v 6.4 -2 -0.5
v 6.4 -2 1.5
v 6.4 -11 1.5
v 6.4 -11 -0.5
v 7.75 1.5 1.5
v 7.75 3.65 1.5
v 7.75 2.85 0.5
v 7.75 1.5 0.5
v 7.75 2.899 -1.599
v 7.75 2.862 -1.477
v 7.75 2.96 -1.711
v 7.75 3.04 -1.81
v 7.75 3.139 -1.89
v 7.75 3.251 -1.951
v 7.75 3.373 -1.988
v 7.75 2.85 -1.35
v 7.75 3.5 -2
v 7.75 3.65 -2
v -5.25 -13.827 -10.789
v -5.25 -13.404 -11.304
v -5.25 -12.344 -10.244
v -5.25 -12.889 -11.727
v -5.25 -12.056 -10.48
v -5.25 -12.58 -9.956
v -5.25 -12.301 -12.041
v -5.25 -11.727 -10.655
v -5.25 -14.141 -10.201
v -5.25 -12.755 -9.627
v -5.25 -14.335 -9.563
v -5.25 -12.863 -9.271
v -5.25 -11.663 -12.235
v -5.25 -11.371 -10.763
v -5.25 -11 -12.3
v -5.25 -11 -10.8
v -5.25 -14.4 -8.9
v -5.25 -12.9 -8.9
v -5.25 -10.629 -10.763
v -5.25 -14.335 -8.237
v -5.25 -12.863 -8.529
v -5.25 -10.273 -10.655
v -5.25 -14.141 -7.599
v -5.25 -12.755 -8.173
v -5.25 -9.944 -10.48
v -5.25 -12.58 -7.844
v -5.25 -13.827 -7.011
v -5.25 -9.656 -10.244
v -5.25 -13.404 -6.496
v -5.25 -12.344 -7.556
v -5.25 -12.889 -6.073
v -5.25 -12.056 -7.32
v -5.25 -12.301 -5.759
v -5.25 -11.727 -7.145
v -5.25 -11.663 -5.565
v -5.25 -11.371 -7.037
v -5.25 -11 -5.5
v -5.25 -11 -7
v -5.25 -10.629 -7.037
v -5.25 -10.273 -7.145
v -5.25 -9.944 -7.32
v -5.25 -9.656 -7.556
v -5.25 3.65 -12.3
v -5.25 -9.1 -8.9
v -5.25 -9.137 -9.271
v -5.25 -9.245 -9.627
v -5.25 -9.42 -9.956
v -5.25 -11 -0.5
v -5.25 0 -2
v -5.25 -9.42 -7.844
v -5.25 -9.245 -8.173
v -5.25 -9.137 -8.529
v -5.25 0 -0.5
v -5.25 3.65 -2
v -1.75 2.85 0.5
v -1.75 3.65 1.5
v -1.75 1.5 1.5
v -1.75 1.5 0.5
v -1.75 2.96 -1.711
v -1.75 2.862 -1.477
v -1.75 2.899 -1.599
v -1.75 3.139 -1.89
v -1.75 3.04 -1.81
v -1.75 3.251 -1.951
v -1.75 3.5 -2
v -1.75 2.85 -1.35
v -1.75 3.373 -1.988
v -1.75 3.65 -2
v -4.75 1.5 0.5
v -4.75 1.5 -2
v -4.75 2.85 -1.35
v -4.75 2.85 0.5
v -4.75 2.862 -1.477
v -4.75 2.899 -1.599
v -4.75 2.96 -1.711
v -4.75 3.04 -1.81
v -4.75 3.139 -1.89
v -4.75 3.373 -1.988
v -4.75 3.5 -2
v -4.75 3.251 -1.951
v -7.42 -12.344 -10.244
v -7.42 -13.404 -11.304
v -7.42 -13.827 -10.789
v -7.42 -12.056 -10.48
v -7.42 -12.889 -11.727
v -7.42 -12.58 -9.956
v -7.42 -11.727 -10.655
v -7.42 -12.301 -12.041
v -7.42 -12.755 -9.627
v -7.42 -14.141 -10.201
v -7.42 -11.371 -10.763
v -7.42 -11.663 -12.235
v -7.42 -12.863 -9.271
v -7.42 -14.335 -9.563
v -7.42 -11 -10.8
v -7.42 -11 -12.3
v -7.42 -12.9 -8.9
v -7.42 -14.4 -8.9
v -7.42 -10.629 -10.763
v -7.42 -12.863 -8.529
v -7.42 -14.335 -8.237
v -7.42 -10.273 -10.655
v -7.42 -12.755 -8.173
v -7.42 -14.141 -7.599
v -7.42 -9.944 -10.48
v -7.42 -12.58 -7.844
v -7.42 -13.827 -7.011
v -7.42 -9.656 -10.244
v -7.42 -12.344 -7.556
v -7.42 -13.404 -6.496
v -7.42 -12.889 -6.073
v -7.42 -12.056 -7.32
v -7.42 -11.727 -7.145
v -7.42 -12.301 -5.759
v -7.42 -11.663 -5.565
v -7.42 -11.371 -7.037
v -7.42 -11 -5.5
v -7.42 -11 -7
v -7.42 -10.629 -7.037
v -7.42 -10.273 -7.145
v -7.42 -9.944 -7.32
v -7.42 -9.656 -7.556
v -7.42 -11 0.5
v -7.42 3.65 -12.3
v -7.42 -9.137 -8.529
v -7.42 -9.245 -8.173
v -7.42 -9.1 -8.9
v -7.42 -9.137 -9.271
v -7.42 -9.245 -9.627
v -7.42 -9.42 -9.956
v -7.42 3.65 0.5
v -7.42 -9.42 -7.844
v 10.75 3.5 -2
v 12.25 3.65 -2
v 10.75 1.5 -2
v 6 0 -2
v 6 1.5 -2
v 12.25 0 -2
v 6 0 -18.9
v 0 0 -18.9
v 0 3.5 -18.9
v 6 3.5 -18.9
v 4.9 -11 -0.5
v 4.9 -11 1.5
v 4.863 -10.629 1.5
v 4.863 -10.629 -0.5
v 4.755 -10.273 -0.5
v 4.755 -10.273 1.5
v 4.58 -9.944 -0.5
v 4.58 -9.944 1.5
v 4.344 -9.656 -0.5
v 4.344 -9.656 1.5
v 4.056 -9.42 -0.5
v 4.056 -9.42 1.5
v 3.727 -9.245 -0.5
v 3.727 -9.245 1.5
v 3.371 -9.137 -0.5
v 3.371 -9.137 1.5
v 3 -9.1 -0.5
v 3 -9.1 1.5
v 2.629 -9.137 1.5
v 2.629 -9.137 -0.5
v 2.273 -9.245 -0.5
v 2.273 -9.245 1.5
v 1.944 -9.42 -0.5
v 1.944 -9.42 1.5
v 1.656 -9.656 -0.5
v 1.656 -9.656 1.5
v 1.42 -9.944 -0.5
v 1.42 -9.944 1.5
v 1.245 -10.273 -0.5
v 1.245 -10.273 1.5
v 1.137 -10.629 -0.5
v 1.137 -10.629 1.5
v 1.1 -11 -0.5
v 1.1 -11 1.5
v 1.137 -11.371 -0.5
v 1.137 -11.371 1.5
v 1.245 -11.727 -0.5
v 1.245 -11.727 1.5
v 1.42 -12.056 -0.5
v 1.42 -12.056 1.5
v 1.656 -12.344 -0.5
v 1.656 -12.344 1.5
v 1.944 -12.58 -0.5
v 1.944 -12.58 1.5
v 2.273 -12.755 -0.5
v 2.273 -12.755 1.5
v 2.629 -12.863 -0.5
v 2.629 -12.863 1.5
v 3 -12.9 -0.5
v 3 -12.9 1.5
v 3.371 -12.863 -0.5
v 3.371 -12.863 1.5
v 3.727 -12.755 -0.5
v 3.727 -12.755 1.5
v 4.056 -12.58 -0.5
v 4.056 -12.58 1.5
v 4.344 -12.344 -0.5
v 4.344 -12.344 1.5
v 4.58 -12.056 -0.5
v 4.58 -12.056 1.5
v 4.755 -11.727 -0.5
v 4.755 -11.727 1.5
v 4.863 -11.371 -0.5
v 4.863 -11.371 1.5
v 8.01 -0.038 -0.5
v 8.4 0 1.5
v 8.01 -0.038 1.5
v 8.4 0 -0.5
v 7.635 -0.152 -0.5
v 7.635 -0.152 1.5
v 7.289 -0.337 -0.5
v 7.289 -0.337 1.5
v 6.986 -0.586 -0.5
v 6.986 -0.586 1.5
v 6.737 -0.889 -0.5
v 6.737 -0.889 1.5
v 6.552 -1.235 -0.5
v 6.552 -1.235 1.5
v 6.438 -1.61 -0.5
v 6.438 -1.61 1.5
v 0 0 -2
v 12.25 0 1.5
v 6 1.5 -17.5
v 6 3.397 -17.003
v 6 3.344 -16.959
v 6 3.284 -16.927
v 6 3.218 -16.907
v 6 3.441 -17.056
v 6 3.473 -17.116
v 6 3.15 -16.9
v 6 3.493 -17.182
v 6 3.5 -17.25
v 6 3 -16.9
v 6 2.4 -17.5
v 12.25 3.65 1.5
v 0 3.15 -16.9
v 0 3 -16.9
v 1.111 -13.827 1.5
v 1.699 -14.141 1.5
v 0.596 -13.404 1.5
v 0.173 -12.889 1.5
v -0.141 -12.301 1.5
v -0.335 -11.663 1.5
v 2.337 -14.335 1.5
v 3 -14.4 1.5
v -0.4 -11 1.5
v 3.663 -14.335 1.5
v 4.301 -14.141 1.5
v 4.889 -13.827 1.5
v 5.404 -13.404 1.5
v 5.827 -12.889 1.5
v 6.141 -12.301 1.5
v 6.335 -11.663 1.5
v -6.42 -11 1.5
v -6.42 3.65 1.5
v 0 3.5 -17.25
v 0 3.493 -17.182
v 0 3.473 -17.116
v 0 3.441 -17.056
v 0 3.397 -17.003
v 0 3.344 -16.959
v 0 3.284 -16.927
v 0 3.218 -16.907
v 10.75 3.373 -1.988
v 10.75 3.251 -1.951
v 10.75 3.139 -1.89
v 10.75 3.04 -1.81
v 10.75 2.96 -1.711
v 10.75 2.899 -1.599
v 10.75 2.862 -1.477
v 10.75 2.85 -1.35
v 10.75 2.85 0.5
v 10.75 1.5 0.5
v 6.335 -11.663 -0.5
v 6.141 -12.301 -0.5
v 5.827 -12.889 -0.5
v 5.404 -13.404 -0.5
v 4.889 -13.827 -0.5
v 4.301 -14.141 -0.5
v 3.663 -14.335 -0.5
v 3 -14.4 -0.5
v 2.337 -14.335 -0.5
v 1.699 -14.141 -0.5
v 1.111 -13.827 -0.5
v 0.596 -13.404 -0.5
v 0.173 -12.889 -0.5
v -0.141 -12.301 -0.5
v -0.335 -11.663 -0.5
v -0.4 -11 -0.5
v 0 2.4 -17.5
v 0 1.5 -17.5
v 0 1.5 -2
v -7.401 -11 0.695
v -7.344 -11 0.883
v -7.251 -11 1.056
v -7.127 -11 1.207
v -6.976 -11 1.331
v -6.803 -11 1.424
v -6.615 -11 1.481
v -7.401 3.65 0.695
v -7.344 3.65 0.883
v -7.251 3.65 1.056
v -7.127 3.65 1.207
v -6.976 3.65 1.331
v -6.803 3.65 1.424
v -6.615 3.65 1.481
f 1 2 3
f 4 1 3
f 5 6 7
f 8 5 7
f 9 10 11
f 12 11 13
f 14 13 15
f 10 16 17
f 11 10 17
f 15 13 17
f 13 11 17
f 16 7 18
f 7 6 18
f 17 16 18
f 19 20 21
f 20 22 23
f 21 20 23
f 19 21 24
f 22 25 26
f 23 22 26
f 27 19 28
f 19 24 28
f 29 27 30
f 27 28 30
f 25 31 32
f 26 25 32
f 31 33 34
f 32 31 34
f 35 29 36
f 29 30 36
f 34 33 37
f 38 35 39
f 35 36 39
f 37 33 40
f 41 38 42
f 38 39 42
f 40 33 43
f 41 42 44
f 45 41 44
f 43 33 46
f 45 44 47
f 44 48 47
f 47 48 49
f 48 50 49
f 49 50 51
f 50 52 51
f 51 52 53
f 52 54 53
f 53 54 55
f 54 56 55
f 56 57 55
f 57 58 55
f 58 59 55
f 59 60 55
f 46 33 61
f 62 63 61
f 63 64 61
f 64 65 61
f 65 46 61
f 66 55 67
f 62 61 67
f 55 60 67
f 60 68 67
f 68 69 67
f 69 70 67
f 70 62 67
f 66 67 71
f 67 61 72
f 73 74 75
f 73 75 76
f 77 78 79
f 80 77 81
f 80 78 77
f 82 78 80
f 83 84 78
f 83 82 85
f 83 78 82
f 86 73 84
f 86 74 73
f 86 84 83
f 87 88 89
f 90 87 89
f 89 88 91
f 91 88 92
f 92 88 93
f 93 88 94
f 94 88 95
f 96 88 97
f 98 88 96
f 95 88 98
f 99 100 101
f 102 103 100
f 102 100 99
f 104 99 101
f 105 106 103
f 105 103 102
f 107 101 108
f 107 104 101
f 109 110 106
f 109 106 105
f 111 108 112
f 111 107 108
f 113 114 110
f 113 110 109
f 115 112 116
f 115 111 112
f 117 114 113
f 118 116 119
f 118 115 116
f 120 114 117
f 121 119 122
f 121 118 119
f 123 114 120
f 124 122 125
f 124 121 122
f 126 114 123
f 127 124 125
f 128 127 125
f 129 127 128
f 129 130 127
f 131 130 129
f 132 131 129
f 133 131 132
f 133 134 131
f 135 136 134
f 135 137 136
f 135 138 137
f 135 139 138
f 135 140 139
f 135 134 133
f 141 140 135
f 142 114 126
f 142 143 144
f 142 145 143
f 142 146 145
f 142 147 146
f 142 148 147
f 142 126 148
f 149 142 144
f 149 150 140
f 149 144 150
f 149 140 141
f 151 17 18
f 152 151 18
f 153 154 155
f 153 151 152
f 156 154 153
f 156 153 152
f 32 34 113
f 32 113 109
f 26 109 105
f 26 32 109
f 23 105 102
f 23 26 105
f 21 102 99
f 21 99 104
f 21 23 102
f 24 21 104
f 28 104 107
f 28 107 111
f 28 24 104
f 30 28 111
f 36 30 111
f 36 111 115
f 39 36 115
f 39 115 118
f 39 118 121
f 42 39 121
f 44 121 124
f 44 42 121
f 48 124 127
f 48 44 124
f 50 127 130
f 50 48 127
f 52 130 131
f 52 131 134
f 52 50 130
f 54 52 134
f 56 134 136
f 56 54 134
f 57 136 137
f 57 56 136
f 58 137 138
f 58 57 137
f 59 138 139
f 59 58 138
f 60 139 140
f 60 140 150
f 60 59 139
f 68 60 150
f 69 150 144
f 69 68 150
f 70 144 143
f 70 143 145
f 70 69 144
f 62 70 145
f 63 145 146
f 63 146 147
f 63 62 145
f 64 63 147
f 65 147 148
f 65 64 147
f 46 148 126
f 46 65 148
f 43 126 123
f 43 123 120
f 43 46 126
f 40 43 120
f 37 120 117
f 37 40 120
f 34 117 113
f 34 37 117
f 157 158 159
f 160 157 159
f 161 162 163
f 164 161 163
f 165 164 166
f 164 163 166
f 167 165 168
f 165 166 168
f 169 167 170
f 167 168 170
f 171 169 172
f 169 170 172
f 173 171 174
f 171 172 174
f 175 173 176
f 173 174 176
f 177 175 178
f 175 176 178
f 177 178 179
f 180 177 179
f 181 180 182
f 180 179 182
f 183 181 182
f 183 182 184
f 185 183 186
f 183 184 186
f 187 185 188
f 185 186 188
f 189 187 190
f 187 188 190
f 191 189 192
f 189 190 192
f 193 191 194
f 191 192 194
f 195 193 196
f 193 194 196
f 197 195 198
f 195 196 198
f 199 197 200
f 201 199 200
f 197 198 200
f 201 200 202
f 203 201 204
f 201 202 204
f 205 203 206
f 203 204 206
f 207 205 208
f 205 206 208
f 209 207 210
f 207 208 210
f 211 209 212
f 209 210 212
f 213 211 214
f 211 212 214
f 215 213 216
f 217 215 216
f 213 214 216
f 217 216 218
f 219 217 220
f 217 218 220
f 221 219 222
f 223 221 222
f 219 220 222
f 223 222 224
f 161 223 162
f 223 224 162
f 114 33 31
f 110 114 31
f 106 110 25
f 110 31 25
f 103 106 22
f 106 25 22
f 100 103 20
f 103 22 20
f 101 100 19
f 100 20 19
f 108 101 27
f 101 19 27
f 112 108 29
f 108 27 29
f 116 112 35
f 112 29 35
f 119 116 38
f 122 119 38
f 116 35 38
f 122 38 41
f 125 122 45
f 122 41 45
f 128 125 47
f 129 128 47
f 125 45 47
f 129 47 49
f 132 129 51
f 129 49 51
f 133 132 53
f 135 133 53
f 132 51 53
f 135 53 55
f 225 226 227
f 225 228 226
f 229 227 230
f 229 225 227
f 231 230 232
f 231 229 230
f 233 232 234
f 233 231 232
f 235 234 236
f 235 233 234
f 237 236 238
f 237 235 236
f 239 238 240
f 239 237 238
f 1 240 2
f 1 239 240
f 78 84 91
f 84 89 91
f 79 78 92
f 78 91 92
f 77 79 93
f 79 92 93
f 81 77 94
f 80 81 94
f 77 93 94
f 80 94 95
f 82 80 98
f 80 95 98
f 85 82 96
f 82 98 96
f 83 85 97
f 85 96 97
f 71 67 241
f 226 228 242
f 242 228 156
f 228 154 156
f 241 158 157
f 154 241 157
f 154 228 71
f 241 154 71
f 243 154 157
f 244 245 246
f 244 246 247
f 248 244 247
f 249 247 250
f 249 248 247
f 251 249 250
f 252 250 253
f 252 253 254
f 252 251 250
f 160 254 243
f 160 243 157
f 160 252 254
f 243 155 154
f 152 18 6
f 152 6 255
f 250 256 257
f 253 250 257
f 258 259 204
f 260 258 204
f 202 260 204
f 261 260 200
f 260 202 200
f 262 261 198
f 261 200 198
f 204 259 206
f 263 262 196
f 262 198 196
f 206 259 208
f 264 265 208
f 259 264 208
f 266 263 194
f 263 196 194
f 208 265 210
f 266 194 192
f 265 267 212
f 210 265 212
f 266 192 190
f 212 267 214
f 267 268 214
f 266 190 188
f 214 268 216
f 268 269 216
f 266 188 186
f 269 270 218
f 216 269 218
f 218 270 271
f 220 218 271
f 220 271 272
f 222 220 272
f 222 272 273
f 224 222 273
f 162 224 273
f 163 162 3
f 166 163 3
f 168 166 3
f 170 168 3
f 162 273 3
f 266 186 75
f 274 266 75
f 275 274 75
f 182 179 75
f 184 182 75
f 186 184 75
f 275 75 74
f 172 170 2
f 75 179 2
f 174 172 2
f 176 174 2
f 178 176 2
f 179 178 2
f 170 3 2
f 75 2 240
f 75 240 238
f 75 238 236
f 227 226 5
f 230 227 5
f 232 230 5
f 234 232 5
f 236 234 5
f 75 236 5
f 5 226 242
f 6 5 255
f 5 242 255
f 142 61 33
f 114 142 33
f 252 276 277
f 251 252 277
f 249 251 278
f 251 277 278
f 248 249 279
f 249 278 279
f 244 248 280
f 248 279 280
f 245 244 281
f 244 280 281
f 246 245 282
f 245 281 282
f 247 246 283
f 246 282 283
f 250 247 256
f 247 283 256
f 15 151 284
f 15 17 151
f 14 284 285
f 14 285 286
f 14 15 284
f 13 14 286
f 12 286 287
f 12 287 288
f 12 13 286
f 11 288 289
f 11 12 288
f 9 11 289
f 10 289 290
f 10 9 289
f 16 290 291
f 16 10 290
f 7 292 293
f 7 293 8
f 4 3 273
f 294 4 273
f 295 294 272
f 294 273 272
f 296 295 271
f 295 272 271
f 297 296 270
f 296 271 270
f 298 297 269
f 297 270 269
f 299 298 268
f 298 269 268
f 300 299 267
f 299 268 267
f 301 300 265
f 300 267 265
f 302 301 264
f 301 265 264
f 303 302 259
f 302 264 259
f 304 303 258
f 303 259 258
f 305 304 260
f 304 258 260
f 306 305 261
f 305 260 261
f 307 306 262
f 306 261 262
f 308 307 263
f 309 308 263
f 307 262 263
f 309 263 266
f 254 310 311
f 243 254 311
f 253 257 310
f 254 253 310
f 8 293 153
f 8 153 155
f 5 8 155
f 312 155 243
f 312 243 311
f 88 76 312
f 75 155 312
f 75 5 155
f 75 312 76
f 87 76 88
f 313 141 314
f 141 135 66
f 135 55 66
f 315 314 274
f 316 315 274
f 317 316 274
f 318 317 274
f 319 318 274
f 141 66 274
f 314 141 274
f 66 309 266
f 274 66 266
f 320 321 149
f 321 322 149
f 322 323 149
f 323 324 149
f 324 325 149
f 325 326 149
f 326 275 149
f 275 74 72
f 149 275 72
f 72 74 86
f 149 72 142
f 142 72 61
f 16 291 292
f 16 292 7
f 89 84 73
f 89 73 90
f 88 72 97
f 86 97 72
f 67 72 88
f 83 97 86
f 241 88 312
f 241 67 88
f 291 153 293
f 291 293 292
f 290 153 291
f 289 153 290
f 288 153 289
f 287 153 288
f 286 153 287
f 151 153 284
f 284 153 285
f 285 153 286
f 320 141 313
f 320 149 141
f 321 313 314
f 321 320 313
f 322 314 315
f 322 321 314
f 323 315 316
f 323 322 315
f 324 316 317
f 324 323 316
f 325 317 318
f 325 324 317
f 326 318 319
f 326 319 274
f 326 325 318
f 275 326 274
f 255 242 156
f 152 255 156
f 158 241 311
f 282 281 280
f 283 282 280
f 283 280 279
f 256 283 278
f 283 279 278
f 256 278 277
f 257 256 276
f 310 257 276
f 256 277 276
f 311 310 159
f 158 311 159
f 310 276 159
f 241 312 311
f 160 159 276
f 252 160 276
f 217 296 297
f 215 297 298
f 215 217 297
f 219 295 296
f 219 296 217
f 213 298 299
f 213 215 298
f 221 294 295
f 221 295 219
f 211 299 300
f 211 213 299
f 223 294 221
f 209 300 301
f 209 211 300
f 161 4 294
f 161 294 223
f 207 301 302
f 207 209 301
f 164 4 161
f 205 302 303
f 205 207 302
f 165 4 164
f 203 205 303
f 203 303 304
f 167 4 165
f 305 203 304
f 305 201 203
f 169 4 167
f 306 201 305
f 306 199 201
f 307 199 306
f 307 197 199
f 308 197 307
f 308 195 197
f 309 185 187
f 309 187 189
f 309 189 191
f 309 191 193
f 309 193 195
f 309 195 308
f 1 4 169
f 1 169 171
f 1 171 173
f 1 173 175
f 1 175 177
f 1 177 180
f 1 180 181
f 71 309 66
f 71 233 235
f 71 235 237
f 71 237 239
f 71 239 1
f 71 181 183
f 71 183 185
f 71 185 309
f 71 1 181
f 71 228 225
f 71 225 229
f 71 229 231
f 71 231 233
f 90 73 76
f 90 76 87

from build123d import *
from OCP.BRepFilletAPI import BRepFilletAPI_MakeFillet

# Parameters (mm, degrees)
BOSS_EXTRUDE1_DEPTH      = 6
BOSS_EXTRUDE2_DEPTH      = 2.15
BOSS_EXTRUDE2_DEPTH_BACK = 1.5
SKETCH3_W                = 18.5
SKETCH3_H                = 3.5
SKETCH4_W                = 15.5
SKETCH4_H                = 1.35
CUT_EXTRUDE1_DEPTH       = 2.5
CUT_EXTRUDE2_REACH       = 24.817
SKETCH5_W                = 9.5
SKETCH5_H                = 5
FILLET1_R                = 0.65
SKETCH6_R                = 1.9
BOSS_EXTRUDE3_DEPTH      = 2
BOSS_EXTRUDE4_DEPTH      = 1.17
BOSS_EXTRUDE4_DEPTH_BACK = 1
SKETCH7_R                = 1.9
FILLET2_R1               = 1
FILLET2_R2               = 2


with BuildPart() as part:
    # Sketch2 → Boss-Extrude1 (new body)
    with BuildSketch(Plane(origin=(0, 0, 0), x_dir=(0, 0, -1), z_dir=(1, 0, 0))):
        with BuildLine():
            Line((0, 0), (18.9, 0))
            Line((18.9, 0), (18.9, 3.5))
            Line((18.9, 3.5), (17.25, 3.5))
            ThreePointArc((17.25, 3.5), (17.002512627, 3.397487373), (16.9, 3.15))
            Line((16.9, 3.15), (16.9, 3))
            Line((16.9, 3), (17.5, 2.4))
            Line((17.5, 2.4), (17.5, 1.5))
            Line((17.5, 1.5), (0, 1.5))
            Line((0, 1.5), (0, 0))
        make_face()
    extrude(amount=BOSS_EXTRUDE1_DEPTH)

    # Sketch3 → Boss-Extrude2 (add, two sides: drawn at the far end of the back side and taken through both)
    with BuildSketch(Plane(origin=(0, 1.5, 0), x_dir=(1, 0, 0), z_dir=(0, 1, 0)).offset(-BOSS_EXTRUDE2_DEPTH_BACK)):
        with Locations((3, 0.25)):
            Rectangle(SKETCH3_W, SKETCH3_H)
    extrude(amount=BOSS_EXTRUDE2_DEPTH + BOSS_EXTRUDE2_DEPTH_BACK)

    # Sketch4 → Cut-Extrude1 (cut)
    with BuildSketch(Plane(origin=(0, 0, -2), x_dir=(-1, 0, 0), z_dir=(0, 0, -1))):
        with Locations((-3, 2.175)):
            Rectangle(SKETCH4_W, SKETCH4_H)
    extrude(amount=-CUT_EXTRUDE1_DEPTH, mode=Mode.SUBTRACT)

    # Cut-Extrude2: up to this face of the body (flat: up to its plane)
    cut_extrude2_end = Plane(part.part.faces().sort_by_distance((3, 1.5, -7.102941176))[0])
    # Sketch5 → Cut-Extrude2 (cut, up to the picked face)
    with BuildSketch(Plane(origin=(0, 3.65, 0), x_dir=(1, 0, 0), z_dir=(0, 1, 0)), mode=Mode.PRIVATE) as cut_extrude2_sk1:
        with Locations((3, 1)):
            Rectangle(SKETCH5_W, SKETCH5_H)
    cut_extrude2_tool1 = split(extrude(cut_extrude2_sk1.sketch, amount=-CUT_EXTRUDE2_REACH, mode=Mode.PRIVATE), bisect_by=cut_extrude2_end, keep=Keep.BOTH, mode=Mode.PRIVATE)
    add(cut_extrude2_tool1.solids().sort_by(Axis((3, 3.65, -1), (0, -1, 0)))[0], mode=Mode.SUBTRACT)

    # Fillet1
    fillet1_edges = [part.edges().sort_by_distance(p)[0] for p in [
        (-3.25, 2.85, -2),
        (9.25, 2.85, -2),
    ]]
    fillet(fillet1_edges, radius=FILLET1_R)

    # Sketch6 → Boss-Extrude3 (add)
    with BuildSketch(Plane.XY.offset(1.5)):
        with BuildLine():
            Line((-5.4, 0), (6.4, 0))
            Line((6.4, 0), (6.4, -11))
            ThreePointArc((6.4, -11), (3, -14.4), (-0.4, -11))
            Line((-0.4, -11), (-5.4, -11))
            Line((-5.4, -11), (-5.4, 0))
        make_face()
        with Locations((3, -11)):
            Circle(SKETCH6_R, mode=Mode.SUBTRACT)
    extrude(amount=-BOSS_EXTRUDE3_DEPTH)

    # Sketch7 → Boss-Extrude4 (add, two sides: drawn at the far end of the back side and taken through both)
    with BuildSketch(Plane.ZY.offset(6.25).offset(-BOSS_EXTRUDE4_DEPTH_BACK)):
        with BuildLine():
            Line((1.5, 3.65), (-12.3, 3.65))
            Line((-12.3, 3.65), (-12.3, -11))
            ThreePointArc((-12.3, -11), (-8.9, -14.4), (-5.5, -11))
            Line((-5.5, -11), (1.5, -11))
            Line((1.5, -11), (1.5, 3.65))
        make_face()
        with Locations(Location((-8.9, -11, 0), (0, 0, 180))):
            Circle(SKETCH7_R, mode=Mode.SUBTRACT)
    extrude(amount=BOSS_EXTRUDE4_DEPTH + BOSS_EXTRUDE4_DEPTH_BACK)

    # Fillet2: one fillet with a radius per group of edges: ONE call of the kernel's fillet builder (fillet() takes one radius for all edges)
    fillet2_edges_1 = [part.edges().sort_by_distance(p)[0] for p in [
        (-7.42, -3.675, 1.5),
    ]]
    fillet2_edges_2 = [part.edges().sort_by_distance(p)[0] for p in [
        (6.4, 0, 0.5),
    ]]
    fillet2 = BRepFilletAPI_MakeFillet(part.part.solid().wrapped)
    for e in fillet2_edges_1:
        fillet2.Add(FILLET2_R1, e.wrapped)
    for e in fillet2_edges_2:
        fillet2.Add(FILLET2_R2, e.wrapped)
    add(Compound.cast(fillet2.Shape()), mode=Mode.REPLACE)


solid = part.part
